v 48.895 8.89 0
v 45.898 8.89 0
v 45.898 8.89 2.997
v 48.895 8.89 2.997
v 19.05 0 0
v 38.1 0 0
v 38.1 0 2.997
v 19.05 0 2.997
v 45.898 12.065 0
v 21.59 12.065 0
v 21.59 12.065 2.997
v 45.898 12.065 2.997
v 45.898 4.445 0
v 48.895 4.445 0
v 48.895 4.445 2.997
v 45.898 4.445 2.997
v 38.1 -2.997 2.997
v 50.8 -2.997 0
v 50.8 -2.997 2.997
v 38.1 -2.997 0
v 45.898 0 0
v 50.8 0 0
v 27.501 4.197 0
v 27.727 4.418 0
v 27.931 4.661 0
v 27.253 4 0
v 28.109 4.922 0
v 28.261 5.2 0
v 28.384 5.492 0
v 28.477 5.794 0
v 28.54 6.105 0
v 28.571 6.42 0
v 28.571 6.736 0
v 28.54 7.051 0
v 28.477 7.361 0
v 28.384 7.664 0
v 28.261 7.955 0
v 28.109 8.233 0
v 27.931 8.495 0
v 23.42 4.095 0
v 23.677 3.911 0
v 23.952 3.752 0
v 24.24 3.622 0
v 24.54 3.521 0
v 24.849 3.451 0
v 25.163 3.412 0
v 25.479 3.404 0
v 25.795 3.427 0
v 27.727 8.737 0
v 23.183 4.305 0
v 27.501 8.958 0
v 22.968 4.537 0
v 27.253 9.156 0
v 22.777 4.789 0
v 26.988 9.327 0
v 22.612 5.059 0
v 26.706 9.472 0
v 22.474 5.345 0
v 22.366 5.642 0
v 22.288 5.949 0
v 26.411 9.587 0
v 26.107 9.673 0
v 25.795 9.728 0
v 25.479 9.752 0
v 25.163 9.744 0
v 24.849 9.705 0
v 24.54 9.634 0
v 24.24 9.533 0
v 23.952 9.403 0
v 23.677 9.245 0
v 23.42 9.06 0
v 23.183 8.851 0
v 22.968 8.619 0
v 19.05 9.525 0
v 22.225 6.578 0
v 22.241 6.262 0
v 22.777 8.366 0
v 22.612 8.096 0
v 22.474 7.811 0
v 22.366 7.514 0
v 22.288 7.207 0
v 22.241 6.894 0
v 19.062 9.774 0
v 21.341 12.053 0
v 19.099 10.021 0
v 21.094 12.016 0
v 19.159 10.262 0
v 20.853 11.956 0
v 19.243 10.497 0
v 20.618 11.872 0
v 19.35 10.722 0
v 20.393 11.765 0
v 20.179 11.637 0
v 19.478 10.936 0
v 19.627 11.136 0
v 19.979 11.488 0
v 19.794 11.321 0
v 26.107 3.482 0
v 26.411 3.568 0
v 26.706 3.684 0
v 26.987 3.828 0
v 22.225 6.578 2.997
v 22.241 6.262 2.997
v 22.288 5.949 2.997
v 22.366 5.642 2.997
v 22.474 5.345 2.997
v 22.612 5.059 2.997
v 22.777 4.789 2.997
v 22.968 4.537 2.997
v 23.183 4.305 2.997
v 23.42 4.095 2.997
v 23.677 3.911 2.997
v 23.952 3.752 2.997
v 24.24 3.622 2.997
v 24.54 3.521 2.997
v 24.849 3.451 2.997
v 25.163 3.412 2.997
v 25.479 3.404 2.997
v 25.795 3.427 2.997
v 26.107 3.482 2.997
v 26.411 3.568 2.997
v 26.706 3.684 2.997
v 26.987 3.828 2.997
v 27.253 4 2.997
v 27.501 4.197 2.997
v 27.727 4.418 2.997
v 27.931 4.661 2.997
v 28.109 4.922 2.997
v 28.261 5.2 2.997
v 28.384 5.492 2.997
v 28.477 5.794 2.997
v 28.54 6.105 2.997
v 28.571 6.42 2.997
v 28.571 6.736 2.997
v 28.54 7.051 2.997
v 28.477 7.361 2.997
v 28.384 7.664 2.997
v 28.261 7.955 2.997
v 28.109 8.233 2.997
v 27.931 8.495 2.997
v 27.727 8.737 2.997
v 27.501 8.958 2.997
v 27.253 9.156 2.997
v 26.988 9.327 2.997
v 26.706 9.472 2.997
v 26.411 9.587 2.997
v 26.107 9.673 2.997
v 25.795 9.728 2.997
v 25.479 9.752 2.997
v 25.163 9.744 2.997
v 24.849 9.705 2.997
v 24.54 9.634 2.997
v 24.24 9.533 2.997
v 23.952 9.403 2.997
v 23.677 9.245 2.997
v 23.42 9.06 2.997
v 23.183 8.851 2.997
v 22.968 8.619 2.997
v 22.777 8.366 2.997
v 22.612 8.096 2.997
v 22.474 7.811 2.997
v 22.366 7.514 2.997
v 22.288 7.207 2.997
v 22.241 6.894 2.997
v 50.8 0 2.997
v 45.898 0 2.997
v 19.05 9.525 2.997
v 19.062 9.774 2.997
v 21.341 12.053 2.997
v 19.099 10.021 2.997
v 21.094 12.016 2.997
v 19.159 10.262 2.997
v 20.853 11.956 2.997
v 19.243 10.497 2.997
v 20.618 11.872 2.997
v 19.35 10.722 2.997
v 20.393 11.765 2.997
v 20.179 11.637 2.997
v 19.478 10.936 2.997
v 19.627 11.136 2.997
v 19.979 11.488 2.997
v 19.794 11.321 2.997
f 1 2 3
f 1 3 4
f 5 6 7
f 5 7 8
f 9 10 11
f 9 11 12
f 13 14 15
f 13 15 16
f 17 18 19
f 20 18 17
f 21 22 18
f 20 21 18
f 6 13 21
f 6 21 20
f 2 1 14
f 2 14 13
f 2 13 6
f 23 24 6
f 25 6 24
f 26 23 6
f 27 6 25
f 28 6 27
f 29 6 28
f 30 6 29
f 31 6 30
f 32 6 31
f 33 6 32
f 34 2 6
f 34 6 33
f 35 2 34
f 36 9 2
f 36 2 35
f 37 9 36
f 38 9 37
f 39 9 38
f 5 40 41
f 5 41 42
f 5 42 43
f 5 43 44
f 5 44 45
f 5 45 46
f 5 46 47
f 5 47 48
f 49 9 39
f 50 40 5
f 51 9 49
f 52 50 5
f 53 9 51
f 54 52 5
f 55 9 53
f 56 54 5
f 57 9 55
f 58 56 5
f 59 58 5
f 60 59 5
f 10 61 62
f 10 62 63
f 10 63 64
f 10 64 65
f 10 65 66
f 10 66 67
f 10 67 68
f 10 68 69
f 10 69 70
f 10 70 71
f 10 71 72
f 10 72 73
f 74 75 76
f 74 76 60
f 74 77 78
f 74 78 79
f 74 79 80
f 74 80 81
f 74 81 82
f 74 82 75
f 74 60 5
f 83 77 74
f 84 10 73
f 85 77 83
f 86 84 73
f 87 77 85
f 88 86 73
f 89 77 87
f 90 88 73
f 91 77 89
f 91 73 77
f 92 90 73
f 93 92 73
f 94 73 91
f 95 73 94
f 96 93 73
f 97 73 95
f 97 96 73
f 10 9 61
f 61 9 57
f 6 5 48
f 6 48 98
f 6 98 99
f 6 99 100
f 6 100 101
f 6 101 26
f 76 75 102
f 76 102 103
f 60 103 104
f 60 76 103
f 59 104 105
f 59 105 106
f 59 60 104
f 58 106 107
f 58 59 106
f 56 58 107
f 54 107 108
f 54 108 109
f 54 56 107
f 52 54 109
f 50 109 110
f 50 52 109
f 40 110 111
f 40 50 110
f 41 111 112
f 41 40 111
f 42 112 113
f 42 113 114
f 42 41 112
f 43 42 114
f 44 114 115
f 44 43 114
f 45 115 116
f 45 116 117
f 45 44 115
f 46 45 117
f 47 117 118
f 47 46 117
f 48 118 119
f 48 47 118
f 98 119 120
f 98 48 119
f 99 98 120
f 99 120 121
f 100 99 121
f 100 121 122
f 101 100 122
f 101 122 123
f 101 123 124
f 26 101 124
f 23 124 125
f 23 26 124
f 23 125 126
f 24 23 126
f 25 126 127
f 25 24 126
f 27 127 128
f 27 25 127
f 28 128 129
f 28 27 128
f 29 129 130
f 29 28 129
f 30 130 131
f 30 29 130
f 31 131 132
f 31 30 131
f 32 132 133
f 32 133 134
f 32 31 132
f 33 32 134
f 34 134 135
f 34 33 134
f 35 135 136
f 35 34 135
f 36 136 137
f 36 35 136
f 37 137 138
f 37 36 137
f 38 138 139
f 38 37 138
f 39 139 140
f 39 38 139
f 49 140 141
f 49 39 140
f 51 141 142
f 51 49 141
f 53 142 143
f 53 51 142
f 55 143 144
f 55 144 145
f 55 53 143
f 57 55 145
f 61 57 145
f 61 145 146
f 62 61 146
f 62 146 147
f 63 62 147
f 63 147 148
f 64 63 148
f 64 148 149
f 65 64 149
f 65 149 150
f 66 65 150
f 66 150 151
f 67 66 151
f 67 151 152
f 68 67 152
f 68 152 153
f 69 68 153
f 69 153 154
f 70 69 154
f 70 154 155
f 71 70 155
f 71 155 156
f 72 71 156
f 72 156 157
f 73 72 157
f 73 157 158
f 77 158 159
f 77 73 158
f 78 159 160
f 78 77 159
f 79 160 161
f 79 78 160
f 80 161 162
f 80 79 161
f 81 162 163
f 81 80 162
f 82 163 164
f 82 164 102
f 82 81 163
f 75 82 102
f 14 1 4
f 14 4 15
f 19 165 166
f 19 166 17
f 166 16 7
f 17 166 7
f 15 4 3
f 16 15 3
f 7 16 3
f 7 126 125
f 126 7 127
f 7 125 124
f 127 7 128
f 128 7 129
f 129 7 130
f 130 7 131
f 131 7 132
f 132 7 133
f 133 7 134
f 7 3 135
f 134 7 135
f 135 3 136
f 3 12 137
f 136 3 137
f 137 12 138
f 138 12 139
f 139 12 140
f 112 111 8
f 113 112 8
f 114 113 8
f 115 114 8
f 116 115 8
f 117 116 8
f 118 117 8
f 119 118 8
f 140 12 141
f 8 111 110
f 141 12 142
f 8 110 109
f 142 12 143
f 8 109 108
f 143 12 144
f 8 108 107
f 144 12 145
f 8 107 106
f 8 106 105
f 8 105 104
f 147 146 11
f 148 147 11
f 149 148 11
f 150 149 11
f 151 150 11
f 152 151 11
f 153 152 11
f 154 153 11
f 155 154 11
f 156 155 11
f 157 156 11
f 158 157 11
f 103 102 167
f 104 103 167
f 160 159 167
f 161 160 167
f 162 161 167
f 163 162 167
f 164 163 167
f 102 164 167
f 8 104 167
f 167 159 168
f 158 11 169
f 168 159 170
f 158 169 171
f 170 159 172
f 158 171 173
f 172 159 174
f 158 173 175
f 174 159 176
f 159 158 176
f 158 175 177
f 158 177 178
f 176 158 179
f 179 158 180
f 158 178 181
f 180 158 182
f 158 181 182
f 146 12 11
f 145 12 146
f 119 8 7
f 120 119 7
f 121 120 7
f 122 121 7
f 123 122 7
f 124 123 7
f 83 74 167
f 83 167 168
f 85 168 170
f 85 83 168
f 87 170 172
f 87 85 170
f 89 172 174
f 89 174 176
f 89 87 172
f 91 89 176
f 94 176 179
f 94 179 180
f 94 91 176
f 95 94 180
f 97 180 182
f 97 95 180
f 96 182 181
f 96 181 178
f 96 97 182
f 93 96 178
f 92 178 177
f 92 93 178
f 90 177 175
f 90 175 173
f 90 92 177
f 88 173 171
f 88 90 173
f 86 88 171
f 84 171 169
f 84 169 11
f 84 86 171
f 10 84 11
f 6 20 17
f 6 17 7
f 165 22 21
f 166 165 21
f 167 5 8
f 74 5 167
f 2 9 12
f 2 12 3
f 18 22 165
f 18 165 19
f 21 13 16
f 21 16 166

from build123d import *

# Parameters (mm, degrees)
SKETCH1_R           = 3.175
BOSS_EXTRUDE1_DEPTH = 2.9972


with BuildPart() as part:
    # Sketch1 → Boss-Extrude1 (new body)
    with BuildSketch(Plane.XY):
        with BuildLine():
            Line((38.1, -2.9972), (50.8, -2.9972))
            Line((50.8, -2.9972), (50.8, 0))
            Line((50.8, 0), (45.8978, 0))
            Line((45.8978, 0), (45.8978, 4.445))
            Line((45.8978, 4.445), (48.895, 4.445))
            Line((48.895, 4.445), (48.895, 8.89))
            Line((48.895, 8.89), (45.8978, 8.89))
            Line((45.8978, 8.89), (45.8978, 12.065))
            Line((45.8978, 12.065), (21.59, 12.065))
            ThreePointArc((21.59, 12.065), (19.793948776, 11.321051224), (19.05, 9.525))
            Line((19.05, 9.525), (19.05, 0))
            Line((19.05, 0), (38.1, 0))
            Line((38.1, 0), (38.1, -2.9972))
        make_face()
        with Locations((25.4, 6.5778)):
            Circle(SKETCH1_R, mode=Mode.SUBTRACT)
    extrude(amount=BOSS_EXTRUDE1_DEPTH)


solid = part.part
